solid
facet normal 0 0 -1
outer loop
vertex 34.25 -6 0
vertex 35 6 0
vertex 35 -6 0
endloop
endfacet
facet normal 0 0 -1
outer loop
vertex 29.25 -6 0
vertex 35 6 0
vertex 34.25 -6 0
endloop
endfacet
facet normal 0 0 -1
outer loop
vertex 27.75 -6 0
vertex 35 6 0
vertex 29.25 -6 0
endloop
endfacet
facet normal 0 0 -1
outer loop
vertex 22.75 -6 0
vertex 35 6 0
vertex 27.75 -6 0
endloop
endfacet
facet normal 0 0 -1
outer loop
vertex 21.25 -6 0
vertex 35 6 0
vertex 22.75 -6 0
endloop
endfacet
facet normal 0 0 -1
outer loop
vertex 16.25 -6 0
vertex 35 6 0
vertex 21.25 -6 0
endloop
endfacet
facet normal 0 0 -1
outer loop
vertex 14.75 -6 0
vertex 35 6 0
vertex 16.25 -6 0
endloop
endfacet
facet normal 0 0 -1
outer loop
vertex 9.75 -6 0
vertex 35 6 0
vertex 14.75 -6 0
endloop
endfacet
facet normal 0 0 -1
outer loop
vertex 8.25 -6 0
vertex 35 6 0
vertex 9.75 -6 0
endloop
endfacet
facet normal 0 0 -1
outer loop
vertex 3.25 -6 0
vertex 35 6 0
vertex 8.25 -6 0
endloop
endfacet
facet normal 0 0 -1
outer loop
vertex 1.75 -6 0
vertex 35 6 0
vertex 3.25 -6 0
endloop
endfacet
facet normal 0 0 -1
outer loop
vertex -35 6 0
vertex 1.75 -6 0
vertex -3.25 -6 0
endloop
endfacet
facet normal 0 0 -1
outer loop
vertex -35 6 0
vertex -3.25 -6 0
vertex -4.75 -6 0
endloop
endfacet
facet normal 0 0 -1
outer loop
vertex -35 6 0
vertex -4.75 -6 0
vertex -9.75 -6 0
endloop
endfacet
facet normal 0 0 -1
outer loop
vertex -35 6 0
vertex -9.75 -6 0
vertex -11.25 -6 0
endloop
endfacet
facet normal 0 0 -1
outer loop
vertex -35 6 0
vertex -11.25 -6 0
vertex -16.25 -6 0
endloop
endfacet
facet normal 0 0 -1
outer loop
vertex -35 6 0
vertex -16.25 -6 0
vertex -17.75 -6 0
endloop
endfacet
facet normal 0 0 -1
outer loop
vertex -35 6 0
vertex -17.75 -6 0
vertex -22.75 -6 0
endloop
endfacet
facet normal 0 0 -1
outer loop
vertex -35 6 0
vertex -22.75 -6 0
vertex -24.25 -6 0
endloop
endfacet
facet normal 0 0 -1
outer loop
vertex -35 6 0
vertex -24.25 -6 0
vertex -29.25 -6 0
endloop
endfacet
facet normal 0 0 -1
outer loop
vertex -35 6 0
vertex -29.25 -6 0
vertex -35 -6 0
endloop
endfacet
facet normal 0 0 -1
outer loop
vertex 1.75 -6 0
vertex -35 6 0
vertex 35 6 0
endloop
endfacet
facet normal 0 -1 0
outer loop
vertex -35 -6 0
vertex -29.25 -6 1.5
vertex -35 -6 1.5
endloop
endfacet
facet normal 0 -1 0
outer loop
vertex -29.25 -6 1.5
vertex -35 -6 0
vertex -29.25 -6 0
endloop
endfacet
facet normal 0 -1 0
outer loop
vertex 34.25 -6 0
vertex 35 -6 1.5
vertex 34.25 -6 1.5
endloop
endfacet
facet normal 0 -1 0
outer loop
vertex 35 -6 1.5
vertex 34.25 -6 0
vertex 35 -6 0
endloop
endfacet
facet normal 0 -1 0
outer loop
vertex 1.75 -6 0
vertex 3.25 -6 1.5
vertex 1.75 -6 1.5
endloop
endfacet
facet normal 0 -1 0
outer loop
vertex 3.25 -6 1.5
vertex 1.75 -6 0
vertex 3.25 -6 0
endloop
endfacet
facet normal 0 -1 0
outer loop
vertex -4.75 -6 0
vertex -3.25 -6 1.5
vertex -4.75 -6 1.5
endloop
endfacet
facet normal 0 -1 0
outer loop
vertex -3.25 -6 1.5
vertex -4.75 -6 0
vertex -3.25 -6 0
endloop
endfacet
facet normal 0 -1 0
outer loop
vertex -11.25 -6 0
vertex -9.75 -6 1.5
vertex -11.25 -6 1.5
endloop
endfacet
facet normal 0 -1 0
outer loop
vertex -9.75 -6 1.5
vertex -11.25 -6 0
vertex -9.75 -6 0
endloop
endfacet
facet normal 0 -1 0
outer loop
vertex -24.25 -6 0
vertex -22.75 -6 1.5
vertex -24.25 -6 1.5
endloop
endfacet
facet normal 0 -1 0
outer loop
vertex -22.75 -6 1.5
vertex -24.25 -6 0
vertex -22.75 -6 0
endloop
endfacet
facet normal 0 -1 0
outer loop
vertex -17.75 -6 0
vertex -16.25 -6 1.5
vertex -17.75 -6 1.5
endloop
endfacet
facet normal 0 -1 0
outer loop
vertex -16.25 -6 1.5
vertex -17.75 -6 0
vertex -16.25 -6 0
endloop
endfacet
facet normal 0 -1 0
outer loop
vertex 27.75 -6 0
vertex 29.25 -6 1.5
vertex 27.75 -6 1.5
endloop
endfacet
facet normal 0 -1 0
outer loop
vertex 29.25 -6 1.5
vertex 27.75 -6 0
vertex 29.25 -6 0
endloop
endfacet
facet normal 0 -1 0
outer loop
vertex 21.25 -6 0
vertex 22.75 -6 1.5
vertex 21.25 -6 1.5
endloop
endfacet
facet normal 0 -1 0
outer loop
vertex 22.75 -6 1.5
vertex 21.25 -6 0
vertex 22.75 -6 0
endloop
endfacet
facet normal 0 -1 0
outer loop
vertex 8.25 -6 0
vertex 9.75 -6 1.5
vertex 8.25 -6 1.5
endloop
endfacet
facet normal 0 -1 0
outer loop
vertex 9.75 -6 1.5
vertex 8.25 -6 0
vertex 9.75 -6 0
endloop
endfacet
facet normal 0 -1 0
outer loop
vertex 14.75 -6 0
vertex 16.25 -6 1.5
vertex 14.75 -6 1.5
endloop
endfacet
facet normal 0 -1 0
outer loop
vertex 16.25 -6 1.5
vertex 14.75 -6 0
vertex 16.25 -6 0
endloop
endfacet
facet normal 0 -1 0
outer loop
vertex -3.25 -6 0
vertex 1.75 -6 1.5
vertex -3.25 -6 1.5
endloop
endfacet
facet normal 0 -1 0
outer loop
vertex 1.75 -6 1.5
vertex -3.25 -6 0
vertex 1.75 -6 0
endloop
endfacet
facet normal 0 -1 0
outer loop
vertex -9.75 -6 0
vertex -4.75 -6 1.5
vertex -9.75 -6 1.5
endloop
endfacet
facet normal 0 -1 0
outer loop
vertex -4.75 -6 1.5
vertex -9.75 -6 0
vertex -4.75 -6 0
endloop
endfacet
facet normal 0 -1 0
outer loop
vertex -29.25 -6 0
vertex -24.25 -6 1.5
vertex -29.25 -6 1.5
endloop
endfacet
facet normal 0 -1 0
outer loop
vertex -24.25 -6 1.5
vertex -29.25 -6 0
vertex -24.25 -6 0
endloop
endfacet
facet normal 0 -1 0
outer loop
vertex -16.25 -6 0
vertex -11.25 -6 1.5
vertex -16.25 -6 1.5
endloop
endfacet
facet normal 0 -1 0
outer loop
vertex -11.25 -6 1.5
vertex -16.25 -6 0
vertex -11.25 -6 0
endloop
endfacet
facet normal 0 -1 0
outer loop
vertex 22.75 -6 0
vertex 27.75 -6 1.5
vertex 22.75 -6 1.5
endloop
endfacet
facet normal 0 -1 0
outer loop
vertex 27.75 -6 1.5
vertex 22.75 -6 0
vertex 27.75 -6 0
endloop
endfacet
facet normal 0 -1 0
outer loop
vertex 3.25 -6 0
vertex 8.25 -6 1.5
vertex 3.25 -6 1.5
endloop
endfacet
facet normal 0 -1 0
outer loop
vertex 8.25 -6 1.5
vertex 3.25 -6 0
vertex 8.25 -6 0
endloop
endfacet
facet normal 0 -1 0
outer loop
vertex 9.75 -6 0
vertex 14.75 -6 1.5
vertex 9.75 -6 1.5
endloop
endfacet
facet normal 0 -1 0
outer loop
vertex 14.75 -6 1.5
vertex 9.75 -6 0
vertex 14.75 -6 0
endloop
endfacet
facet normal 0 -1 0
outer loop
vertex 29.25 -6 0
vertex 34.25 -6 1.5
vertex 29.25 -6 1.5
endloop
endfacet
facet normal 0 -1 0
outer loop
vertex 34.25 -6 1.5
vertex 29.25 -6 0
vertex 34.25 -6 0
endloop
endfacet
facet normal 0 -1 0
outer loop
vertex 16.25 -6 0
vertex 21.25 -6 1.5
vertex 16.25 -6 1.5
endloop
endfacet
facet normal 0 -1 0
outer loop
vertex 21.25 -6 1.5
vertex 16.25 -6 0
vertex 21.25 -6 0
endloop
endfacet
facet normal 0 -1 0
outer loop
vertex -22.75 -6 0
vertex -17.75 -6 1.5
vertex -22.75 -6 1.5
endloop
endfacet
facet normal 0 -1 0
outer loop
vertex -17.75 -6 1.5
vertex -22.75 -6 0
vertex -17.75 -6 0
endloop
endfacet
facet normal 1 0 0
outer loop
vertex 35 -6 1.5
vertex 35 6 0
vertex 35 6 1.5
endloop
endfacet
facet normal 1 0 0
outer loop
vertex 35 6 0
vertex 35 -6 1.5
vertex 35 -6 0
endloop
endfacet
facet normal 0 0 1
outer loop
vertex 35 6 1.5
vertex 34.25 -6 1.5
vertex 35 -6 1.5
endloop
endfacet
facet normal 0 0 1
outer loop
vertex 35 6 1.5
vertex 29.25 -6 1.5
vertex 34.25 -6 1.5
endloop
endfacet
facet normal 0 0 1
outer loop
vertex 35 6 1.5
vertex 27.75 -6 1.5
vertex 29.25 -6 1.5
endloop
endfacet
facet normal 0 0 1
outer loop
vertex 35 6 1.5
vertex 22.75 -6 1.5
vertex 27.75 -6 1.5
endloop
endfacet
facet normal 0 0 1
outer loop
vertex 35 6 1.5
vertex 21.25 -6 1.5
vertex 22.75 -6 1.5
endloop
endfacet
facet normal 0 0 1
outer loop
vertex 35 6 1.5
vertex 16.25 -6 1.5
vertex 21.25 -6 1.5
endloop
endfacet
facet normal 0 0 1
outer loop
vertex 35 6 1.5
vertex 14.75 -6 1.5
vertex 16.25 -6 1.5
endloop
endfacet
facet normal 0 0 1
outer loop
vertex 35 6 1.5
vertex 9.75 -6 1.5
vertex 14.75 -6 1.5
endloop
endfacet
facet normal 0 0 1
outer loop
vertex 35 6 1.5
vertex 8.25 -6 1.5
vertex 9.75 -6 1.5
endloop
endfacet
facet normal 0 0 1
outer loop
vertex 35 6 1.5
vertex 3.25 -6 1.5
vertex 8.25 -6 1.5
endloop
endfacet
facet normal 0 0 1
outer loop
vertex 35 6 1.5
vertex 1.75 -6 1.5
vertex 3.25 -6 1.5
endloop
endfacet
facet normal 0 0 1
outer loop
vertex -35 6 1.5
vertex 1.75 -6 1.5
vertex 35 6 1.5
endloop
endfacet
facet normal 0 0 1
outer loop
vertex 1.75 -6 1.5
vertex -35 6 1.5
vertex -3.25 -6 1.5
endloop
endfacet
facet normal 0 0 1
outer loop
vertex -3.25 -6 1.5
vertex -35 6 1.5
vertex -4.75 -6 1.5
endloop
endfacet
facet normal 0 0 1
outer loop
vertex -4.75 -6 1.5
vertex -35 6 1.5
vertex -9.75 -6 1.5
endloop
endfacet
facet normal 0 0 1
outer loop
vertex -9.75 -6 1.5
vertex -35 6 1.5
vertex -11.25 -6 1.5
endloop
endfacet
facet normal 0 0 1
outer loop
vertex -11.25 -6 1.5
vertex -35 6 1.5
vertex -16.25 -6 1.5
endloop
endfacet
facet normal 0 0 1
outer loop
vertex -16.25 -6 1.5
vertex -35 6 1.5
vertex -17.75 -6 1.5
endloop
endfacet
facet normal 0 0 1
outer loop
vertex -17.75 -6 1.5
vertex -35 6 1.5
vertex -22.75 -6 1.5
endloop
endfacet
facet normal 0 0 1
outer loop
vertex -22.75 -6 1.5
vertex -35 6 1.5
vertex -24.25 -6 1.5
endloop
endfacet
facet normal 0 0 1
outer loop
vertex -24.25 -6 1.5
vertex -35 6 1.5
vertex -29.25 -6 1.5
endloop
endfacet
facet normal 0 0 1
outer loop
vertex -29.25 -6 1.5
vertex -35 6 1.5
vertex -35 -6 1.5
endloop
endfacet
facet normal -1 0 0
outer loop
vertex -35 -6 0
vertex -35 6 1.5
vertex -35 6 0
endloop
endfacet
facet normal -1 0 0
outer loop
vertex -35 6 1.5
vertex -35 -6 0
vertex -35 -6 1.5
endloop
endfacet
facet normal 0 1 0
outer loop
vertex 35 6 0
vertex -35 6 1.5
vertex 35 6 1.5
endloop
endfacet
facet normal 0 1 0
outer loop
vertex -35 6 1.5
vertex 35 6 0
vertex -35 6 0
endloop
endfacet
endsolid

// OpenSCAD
// 10-well comb for casting agarose gels
// Print orientation: flat on bed, teeth pointing down (-Z)

// ---------- Parameters ----------
plate_t      = 1.5;   // plate thickness (Z)
spine_len    = 70;    // spine length (X)
spine_w      = 12;    // spine width (Y)
tooth_count  = 10;    // number of teeth
tooth_w      = 5.0;   // tooth width (X)
tooth_len    = 12;    // tooth length (Y)
tooth_h      = 12;    // tooth height from spine (Z)
gap          = 1.5;   // gap between teeth (X)
eps          = 0.5;   // overcut for clean booleans

$fn = 64;

// ---------- Derived ----------
pitch       = tooth_w + gap;
spine_x0    = -spine_len / 2;
spine_y0    = -spine_w / 2;
tooth_x0    = -(tooth_count - 1) * pitch / 2;   // row centred on origin
tooth_y0    = spine_y0 - tooth_len;             // teeth hang in -Y

// ---------- Model ----------
difference() {
    union() {
        // Plate (spine + teeth)
        translate([spine_x0, spine_y0, 0])
            cube([spine_len, spine_w, plate_t]);
        for (i = [0 : tooth_count - 1])
            translate([tooth_x0 + i * pitch, tooth_y0, 0])
                cube([tooth_w, tooth_len, tooth_h]);
    }
    // Wells (through-cut, past both top and bottom faces)
    for (i = [0 : tooth_count - 1])
        translate([tooth_x0 + i * pitch, tooth_y0, -eps])
            cube([tooth_w, tooth_len, tooth_h + 2 * eps]);
}
